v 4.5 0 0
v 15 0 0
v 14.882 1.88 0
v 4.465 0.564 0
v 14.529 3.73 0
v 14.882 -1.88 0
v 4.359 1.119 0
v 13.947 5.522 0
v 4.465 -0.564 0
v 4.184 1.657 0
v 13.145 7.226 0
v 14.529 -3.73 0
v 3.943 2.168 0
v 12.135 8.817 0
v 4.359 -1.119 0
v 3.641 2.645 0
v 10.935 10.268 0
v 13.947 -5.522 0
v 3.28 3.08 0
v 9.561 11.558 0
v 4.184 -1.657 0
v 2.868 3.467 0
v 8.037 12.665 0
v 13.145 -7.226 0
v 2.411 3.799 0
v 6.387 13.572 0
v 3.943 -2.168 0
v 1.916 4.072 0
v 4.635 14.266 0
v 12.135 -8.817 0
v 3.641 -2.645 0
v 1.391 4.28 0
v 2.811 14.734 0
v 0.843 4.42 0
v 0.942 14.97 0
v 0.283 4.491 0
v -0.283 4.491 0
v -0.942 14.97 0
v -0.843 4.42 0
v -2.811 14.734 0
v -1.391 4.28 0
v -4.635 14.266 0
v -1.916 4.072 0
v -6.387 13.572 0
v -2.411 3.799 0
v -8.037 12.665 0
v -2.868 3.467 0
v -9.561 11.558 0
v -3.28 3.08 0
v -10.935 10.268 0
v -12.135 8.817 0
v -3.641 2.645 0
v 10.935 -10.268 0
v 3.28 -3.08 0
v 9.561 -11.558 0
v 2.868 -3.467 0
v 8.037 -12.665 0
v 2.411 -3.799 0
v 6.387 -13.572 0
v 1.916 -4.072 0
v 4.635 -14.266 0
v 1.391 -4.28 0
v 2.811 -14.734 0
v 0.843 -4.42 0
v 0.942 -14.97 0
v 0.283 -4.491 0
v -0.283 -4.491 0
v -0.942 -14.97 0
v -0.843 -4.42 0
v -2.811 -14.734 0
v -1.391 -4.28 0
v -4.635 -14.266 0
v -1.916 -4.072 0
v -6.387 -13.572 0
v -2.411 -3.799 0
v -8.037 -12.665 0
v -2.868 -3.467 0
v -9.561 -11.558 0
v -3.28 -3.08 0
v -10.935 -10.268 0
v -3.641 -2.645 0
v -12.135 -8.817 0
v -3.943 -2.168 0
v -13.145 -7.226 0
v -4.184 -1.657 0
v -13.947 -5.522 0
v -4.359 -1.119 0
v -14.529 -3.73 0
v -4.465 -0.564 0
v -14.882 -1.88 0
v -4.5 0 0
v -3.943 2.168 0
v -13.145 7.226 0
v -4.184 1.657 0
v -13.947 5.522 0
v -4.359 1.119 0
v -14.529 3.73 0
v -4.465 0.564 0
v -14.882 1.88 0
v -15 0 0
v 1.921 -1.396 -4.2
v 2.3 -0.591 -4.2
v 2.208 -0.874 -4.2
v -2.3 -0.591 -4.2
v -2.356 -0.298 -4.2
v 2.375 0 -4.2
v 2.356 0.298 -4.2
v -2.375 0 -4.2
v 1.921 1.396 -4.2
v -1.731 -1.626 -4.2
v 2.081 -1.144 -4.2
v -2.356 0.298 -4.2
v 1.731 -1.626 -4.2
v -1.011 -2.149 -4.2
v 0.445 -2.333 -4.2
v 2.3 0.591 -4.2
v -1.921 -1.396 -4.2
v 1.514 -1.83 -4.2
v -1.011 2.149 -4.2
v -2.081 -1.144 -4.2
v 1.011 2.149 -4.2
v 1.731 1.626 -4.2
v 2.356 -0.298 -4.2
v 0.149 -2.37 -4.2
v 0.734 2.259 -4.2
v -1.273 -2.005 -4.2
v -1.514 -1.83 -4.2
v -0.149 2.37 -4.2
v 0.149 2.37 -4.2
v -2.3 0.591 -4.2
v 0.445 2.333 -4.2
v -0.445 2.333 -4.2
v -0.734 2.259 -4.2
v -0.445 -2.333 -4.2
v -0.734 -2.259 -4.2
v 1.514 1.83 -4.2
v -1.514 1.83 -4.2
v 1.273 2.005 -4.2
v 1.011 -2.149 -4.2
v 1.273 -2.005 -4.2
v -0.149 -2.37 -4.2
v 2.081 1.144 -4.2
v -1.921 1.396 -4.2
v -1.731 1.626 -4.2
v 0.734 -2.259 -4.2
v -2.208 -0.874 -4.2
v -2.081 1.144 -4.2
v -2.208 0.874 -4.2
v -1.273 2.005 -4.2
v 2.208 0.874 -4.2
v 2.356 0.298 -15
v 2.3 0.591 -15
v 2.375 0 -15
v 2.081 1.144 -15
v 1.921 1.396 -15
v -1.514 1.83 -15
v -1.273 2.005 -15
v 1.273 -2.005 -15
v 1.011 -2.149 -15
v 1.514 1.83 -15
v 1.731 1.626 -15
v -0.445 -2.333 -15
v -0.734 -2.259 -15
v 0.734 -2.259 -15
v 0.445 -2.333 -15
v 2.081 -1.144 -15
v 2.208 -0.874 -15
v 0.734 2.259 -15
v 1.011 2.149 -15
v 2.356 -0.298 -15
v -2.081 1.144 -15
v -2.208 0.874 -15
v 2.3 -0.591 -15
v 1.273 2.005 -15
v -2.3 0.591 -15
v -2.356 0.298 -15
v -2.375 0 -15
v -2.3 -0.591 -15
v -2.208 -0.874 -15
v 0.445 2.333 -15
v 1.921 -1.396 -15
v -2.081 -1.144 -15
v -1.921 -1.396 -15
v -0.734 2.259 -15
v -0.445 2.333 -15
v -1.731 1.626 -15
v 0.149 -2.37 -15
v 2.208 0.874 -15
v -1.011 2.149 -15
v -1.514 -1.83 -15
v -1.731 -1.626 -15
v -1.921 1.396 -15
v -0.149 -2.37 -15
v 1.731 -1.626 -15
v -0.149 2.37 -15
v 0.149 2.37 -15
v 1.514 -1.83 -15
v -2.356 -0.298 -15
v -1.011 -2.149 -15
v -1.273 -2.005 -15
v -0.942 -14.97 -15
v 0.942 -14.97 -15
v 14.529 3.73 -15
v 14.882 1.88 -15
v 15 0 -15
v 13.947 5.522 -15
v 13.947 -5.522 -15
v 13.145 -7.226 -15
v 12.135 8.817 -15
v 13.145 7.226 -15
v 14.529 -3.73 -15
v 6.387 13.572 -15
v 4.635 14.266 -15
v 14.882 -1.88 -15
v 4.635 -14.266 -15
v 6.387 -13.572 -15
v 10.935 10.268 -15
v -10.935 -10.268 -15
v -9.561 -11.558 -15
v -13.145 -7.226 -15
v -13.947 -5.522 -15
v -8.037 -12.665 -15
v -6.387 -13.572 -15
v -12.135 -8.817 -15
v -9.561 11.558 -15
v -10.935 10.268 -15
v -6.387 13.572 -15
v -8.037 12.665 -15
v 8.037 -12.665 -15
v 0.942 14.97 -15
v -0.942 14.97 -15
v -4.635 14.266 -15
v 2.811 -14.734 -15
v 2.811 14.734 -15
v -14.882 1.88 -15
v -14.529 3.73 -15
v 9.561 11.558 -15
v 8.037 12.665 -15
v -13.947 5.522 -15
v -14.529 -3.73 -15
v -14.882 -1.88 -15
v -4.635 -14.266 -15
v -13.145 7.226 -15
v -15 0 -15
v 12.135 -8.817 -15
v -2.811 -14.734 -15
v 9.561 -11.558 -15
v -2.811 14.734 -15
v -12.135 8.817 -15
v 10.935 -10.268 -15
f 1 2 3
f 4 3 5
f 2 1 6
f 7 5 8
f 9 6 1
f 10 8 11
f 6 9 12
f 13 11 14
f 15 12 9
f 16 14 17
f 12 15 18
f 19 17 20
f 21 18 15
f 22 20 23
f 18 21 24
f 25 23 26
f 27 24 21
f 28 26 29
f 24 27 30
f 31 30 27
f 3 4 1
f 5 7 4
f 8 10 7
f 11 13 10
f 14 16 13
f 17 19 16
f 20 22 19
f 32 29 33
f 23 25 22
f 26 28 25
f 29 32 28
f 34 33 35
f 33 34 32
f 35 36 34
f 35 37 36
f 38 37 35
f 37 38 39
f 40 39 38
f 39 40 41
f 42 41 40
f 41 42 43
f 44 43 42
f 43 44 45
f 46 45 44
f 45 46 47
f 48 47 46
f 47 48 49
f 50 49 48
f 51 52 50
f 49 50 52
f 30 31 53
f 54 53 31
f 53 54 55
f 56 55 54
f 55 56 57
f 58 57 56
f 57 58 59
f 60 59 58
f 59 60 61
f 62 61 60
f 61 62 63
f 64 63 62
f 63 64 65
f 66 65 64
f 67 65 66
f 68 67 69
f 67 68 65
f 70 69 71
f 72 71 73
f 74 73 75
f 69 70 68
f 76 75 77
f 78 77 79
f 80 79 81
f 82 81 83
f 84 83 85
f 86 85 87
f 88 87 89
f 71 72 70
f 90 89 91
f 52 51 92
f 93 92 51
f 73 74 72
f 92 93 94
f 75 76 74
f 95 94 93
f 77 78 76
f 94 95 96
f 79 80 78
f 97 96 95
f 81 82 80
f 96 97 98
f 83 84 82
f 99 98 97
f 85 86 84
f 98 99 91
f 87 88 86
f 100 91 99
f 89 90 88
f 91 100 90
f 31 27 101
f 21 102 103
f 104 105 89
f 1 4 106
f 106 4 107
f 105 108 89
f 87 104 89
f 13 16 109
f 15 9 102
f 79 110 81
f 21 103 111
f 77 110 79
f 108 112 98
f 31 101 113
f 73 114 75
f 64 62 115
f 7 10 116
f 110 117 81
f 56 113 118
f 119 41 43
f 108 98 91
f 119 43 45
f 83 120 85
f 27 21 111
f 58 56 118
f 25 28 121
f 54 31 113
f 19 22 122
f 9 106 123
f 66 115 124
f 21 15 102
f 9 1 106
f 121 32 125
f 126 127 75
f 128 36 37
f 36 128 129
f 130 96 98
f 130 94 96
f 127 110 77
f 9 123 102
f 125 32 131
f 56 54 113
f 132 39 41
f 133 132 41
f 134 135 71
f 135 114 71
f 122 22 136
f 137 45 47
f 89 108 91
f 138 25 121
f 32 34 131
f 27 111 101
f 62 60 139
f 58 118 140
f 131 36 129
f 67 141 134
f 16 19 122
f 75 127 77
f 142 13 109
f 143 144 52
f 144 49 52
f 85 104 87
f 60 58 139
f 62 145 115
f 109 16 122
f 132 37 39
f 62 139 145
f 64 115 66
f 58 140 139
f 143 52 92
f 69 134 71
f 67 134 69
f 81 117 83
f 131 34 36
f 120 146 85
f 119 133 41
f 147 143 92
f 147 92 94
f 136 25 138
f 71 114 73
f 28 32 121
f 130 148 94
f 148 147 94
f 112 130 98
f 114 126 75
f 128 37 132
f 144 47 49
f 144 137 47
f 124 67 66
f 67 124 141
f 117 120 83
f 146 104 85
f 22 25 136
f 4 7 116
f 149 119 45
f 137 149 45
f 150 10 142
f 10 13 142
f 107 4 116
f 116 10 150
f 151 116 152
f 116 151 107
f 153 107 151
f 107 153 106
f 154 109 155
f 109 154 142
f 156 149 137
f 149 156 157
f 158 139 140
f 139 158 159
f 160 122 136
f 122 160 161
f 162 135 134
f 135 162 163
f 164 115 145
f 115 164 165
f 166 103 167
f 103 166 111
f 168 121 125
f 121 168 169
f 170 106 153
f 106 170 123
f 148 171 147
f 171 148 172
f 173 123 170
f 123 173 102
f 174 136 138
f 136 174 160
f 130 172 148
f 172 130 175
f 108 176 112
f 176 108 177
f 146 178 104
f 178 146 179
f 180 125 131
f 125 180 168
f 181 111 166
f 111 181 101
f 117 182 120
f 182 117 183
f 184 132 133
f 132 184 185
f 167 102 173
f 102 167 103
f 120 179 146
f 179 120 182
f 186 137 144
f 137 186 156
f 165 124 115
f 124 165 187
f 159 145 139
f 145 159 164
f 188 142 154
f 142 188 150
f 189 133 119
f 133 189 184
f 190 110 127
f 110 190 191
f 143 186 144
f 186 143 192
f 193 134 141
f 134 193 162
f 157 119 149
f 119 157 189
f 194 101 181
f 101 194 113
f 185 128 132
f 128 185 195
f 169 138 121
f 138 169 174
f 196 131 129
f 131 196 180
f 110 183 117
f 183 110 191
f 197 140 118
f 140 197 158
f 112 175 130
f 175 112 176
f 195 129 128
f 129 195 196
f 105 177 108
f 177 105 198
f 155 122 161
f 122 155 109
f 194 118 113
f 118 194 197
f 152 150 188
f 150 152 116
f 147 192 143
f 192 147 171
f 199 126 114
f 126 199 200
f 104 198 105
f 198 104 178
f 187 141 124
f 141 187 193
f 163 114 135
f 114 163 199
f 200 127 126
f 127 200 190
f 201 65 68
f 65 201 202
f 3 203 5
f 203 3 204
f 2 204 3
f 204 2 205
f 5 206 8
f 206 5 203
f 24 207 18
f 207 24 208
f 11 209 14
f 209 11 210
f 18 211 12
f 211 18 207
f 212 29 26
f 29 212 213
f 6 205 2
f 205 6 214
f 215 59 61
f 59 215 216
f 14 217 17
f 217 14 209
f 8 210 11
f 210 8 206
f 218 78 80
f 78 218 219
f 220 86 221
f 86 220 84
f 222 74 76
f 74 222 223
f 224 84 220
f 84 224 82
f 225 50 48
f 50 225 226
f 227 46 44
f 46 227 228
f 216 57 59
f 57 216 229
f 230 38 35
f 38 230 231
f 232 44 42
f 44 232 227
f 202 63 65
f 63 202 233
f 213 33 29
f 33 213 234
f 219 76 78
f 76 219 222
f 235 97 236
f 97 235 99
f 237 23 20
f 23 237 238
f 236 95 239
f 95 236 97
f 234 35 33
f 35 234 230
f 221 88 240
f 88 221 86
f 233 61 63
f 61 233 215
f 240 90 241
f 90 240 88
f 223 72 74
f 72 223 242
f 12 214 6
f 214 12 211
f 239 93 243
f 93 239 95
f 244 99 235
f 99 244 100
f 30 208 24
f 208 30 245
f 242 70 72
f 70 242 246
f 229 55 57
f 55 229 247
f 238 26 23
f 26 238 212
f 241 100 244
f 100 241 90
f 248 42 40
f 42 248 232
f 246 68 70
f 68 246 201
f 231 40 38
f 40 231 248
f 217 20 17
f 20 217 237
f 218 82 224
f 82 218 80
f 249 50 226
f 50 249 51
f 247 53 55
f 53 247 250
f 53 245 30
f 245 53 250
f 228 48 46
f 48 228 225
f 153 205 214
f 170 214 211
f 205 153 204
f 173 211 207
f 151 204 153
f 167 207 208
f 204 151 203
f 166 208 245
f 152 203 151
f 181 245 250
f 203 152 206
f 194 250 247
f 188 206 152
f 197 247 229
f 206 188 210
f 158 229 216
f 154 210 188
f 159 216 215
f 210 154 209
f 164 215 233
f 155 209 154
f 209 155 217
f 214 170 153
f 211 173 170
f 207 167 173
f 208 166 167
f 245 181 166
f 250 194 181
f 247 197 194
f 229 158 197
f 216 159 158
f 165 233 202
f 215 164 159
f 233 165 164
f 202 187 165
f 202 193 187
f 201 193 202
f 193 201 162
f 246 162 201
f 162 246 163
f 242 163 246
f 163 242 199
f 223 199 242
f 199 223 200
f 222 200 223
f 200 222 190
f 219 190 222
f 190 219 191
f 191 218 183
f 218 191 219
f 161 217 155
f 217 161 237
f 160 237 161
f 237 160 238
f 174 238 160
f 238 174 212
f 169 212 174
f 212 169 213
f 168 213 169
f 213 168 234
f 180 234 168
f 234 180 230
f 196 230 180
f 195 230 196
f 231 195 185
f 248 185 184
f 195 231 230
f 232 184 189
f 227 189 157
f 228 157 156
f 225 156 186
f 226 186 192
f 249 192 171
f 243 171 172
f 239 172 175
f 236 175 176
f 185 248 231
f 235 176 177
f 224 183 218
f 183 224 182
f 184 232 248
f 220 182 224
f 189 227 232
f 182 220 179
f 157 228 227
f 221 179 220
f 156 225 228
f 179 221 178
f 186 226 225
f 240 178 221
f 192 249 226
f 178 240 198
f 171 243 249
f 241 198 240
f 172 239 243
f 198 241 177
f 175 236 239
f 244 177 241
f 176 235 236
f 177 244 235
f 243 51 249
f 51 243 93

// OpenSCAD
$fn = 50;

difference() {
	union() {
		translate(v = [0, 0, -15.0]) {
			cylinder(h = 15, r = 15.0);
		}
	}
	union() {
		translate(v = [0, 0, 0]) {
			rotate(a = [0, 0, 0]) {
				difference() {
					union() {
						translate(v = [0, 0, -18.0]) {
							cylinder(h = 18, r = 2.25);
						}
						translate(v = [0, 0, -4.2]) {
							cylinder(h = 4.2, r1 = 2.375, r2 = 4.5);
						}
						translate(v = [0, 0, -18.0]) {
							cylinder(h = 18, r = 2.375);
						}
						translate(v = [0, 0, -18.0]) {
							cylinder(h = 18, r = 2.25);
						}
					}
					union();
				}
			}
		}
	}
}
